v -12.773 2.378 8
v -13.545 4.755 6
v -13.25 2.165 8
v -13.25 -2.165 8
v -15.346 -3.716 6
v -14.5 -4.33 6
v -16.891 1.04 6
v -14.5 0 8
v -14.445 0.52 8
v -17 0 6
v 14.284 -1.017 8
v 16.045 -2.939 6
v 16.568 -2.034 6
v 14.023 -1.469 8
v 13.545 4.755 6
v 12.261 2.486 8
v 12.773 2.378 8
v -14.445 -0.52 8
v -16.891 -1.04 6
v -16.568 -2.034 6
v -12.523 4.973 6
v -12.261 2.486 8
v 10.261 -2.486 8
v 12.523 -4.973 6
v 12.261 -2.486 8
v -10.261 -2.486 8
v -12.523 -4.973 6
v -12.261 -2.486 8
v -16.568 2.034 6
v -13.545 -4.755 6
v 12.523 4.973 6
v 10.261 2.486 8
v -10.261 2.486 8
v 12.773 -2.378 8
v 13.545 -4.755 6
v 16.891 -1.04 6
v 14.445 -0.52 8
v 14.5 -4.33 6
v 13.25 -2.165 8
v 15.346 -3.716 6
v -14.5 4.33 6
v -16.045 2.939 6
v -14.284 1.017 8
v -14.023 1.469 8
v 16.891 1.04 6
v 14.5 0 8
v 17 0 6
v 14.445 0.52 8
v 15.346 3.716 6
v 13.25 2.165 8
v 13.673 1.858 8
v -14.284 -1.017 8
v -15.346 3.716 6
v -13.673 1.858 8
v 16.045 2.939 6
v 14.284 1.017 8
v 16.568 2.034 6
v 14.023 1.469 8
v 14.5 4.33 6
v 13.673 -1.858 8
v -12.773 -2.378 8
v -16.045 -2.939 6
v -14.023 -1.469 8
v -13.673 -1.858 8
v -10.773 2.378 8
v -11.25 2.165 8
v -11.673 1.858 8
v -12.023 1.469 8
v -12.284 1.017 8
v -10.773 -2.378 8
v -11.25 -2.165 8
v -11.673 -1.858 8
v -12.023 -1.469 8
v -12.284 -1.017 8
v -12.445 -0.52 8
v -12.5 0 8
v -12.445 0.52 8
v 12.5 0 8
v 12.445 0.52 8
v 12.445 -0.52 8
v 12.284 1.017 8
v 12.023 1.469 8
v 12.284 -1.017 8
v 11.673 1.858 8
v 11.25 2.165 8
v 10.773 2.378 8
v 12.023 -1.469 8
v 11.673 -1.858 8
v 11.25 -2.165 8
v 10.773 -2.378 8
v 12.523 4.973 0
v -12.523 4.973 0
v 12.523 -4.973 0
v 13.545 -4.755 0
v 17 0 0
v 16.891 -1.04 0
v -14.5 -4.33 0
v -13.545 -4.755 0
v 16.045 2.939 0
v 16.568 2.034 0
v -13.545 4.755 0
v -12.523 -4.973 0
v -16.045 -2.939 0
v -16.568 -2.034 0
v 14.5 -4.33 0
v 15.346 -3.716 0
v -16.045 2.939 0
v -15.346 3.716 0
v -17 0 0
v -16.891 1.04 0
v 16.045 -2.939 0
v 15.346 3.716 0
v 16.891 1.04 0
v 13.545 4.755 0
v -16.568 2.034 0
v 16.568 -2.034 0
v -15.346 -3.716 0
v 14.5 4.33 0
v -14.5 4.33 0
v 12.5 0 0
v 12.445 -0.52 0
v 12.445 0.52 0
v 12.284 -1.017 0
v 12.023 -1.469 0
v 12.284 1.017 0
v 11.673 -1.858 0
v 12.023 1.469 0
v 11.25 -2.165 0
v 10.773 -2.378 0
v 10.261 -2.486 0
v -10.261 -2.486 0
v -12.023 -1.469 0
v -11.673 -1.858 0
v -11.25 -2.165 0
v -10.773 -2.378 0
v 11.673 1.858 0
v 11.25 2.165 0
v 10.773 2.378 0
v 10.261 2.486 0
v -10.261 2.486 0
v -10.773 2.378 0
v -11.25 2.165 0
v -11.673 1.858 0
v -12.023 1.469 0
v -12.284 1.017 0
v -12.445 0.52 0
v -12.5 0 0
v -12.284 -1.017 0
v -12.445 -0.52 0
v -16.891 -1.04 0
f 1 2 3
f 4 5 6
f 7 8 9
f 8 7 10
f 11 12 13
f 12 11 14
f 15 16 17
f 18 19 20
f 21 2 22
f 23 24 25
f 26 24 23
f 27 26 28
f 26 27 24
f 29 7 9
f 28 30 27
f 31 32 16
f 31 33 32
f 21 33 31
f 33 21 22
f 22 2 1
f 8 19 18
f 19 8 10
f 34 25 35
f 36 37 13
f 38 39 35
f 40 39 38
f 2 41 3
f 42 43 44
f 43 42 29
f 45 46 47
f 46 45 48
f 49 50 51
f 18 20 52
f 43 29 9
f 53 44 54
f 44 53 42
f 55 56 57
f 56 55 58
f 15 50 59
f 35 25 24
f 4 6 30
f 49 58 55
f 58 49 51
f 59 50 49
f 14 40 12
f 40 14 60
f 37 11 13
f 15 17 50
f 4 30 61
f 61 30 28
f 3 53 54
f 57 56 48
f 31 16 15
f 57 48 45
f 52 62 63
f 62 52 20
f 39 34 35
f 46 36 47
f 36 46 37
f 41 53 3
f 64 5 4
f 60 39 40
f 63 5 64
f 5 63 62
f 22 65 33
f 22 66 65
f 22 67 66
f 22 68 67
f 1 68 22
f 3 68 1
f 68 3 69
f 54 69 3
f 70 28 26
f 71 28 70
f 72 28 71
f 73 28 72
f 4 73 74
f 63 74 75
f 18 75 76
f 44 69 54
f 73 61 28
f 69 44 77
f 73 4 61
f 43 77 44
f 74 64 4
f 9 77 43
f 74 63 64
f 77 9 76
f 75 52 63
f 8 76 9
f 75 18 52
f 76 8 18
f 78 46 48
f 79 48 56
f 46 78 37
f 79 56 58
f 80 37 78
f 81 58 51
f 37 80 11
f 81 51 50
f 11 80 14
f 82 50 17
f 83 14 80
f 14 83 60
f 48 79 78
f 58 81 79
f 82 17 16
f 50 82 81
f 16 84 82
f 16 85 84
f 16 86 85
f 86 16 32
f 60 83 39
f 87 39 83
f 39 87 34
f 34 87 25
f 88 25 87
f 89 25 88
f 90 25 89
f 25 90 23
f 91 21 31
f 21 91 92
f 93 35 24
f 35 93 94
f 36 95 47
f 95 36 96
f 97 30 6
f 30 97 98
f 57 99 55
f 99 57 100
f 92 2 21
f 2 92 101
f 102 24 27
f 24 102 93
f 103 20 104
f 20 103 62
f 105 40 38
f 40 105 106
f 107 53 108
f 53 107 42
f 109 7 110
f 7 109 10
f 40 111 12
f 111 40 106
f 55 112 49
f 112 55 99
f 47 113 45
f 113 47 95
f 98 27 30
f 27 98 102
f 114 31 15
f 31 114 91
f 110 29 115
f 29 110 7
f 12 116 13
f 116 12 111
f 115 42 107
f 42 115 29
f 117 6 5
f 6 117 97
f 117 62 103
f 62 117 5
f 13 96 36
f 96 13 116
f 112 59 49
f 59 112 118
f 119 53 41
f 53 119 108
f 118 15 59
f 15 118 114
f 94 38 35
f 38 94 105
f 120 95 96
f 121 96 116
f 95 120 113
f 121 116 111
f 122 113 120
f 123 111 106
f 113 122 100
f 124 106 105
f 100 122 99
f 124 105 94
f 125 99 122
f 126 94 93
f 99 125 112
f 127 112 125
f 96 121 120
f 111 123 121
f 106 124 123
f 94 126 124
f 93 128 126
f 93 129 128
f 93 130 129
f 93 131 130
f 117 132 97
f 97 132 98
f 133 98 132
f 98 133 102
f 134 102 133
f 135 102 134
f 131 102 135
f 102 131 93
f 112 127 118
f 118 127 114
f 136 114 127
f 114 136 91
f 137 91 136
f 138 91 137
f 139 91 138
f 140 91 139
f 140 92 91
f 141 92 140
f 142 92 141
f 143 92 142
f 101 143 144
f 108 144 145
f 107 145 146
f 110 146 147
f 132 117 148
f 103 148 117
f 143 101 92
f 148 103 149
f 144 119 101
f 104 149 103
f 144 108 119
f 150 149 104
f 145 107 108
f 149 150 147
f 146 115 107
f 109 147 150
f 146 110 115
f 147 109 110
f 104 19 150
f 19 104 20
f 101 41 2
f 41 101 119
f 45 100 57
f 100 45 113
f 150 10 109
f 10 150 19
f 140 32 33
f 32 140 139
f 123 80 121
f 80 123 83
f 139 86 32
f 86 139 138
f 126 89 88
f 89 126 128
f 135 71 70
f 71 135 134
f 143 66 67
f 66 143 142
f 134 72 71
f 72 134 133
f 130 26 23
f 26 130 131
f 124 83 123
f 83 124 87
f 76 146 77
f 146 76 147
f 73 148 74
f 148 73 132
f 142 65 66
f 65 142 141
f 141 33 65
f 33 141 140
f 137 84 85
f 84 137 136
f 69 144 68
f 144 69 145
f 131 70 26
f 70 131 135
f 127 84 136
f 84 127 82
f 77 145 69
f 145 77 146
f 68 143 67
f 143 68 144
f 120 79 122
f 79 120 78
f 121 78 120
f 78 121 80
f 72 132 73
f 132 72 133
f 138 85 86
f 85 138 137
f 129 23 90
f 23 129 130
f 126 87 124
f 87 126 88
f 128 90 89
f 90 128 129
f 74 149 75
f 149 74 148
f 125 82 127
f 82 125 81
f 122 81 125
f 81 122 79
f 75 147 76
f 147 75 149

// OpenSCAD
TOP_WIDTH = 5;
TOP_HEIGHT = 2;
BOT_WIDTH = 10;

HOLE_DIA = 5;
HOLE_SPACING = 20;
HEIGHT = 8;
LENGTH = 34;

$fn = 30;

module raiser() {
  difference() {
    union() {
      translate([0, 0, HEIGHT - TOP_HEIGHT])
      hull() {
      translate([-(LENGTH - BOT_WIDTH)/2, 0, 0])
      cylinder(d2 = TOP_WIDTH, d1 = BOT_WIDTH, h = TOP_HEIGHT);
      translate([(LENGTH - BOT_WIDTH)/2, 0, 0])
      cylinder(d2 = TOP_WIDTH, d1 = BOT_WIDTH, h = TOP_HEIGHT);
      }
      hull() {
        translate([-(LENGTH - BOT_WIDTH)/2, 0, 0])
        cylinder(d = BOT_WIDTH, h = HEIGHT - TOP_HEIGHT);
        translate([(LENGTH - BOT_WIDTH)/2, 0, 0])
        cylinder(d = BOT_WIDTH, h = HEIGHT - TOP_HEIGHT);

      }
    }

    hull() {
      translate([-HOLE_SPACING/2, 0, 0])
      cylinder(d = HOLE_DIA, h = HEIGHT);
      translate([HOLE_SPACING/2, 0, 0])
      cylinder(d = HOLE_DIA, h = HEIGHT);

    }    
  }
}
raiser();
